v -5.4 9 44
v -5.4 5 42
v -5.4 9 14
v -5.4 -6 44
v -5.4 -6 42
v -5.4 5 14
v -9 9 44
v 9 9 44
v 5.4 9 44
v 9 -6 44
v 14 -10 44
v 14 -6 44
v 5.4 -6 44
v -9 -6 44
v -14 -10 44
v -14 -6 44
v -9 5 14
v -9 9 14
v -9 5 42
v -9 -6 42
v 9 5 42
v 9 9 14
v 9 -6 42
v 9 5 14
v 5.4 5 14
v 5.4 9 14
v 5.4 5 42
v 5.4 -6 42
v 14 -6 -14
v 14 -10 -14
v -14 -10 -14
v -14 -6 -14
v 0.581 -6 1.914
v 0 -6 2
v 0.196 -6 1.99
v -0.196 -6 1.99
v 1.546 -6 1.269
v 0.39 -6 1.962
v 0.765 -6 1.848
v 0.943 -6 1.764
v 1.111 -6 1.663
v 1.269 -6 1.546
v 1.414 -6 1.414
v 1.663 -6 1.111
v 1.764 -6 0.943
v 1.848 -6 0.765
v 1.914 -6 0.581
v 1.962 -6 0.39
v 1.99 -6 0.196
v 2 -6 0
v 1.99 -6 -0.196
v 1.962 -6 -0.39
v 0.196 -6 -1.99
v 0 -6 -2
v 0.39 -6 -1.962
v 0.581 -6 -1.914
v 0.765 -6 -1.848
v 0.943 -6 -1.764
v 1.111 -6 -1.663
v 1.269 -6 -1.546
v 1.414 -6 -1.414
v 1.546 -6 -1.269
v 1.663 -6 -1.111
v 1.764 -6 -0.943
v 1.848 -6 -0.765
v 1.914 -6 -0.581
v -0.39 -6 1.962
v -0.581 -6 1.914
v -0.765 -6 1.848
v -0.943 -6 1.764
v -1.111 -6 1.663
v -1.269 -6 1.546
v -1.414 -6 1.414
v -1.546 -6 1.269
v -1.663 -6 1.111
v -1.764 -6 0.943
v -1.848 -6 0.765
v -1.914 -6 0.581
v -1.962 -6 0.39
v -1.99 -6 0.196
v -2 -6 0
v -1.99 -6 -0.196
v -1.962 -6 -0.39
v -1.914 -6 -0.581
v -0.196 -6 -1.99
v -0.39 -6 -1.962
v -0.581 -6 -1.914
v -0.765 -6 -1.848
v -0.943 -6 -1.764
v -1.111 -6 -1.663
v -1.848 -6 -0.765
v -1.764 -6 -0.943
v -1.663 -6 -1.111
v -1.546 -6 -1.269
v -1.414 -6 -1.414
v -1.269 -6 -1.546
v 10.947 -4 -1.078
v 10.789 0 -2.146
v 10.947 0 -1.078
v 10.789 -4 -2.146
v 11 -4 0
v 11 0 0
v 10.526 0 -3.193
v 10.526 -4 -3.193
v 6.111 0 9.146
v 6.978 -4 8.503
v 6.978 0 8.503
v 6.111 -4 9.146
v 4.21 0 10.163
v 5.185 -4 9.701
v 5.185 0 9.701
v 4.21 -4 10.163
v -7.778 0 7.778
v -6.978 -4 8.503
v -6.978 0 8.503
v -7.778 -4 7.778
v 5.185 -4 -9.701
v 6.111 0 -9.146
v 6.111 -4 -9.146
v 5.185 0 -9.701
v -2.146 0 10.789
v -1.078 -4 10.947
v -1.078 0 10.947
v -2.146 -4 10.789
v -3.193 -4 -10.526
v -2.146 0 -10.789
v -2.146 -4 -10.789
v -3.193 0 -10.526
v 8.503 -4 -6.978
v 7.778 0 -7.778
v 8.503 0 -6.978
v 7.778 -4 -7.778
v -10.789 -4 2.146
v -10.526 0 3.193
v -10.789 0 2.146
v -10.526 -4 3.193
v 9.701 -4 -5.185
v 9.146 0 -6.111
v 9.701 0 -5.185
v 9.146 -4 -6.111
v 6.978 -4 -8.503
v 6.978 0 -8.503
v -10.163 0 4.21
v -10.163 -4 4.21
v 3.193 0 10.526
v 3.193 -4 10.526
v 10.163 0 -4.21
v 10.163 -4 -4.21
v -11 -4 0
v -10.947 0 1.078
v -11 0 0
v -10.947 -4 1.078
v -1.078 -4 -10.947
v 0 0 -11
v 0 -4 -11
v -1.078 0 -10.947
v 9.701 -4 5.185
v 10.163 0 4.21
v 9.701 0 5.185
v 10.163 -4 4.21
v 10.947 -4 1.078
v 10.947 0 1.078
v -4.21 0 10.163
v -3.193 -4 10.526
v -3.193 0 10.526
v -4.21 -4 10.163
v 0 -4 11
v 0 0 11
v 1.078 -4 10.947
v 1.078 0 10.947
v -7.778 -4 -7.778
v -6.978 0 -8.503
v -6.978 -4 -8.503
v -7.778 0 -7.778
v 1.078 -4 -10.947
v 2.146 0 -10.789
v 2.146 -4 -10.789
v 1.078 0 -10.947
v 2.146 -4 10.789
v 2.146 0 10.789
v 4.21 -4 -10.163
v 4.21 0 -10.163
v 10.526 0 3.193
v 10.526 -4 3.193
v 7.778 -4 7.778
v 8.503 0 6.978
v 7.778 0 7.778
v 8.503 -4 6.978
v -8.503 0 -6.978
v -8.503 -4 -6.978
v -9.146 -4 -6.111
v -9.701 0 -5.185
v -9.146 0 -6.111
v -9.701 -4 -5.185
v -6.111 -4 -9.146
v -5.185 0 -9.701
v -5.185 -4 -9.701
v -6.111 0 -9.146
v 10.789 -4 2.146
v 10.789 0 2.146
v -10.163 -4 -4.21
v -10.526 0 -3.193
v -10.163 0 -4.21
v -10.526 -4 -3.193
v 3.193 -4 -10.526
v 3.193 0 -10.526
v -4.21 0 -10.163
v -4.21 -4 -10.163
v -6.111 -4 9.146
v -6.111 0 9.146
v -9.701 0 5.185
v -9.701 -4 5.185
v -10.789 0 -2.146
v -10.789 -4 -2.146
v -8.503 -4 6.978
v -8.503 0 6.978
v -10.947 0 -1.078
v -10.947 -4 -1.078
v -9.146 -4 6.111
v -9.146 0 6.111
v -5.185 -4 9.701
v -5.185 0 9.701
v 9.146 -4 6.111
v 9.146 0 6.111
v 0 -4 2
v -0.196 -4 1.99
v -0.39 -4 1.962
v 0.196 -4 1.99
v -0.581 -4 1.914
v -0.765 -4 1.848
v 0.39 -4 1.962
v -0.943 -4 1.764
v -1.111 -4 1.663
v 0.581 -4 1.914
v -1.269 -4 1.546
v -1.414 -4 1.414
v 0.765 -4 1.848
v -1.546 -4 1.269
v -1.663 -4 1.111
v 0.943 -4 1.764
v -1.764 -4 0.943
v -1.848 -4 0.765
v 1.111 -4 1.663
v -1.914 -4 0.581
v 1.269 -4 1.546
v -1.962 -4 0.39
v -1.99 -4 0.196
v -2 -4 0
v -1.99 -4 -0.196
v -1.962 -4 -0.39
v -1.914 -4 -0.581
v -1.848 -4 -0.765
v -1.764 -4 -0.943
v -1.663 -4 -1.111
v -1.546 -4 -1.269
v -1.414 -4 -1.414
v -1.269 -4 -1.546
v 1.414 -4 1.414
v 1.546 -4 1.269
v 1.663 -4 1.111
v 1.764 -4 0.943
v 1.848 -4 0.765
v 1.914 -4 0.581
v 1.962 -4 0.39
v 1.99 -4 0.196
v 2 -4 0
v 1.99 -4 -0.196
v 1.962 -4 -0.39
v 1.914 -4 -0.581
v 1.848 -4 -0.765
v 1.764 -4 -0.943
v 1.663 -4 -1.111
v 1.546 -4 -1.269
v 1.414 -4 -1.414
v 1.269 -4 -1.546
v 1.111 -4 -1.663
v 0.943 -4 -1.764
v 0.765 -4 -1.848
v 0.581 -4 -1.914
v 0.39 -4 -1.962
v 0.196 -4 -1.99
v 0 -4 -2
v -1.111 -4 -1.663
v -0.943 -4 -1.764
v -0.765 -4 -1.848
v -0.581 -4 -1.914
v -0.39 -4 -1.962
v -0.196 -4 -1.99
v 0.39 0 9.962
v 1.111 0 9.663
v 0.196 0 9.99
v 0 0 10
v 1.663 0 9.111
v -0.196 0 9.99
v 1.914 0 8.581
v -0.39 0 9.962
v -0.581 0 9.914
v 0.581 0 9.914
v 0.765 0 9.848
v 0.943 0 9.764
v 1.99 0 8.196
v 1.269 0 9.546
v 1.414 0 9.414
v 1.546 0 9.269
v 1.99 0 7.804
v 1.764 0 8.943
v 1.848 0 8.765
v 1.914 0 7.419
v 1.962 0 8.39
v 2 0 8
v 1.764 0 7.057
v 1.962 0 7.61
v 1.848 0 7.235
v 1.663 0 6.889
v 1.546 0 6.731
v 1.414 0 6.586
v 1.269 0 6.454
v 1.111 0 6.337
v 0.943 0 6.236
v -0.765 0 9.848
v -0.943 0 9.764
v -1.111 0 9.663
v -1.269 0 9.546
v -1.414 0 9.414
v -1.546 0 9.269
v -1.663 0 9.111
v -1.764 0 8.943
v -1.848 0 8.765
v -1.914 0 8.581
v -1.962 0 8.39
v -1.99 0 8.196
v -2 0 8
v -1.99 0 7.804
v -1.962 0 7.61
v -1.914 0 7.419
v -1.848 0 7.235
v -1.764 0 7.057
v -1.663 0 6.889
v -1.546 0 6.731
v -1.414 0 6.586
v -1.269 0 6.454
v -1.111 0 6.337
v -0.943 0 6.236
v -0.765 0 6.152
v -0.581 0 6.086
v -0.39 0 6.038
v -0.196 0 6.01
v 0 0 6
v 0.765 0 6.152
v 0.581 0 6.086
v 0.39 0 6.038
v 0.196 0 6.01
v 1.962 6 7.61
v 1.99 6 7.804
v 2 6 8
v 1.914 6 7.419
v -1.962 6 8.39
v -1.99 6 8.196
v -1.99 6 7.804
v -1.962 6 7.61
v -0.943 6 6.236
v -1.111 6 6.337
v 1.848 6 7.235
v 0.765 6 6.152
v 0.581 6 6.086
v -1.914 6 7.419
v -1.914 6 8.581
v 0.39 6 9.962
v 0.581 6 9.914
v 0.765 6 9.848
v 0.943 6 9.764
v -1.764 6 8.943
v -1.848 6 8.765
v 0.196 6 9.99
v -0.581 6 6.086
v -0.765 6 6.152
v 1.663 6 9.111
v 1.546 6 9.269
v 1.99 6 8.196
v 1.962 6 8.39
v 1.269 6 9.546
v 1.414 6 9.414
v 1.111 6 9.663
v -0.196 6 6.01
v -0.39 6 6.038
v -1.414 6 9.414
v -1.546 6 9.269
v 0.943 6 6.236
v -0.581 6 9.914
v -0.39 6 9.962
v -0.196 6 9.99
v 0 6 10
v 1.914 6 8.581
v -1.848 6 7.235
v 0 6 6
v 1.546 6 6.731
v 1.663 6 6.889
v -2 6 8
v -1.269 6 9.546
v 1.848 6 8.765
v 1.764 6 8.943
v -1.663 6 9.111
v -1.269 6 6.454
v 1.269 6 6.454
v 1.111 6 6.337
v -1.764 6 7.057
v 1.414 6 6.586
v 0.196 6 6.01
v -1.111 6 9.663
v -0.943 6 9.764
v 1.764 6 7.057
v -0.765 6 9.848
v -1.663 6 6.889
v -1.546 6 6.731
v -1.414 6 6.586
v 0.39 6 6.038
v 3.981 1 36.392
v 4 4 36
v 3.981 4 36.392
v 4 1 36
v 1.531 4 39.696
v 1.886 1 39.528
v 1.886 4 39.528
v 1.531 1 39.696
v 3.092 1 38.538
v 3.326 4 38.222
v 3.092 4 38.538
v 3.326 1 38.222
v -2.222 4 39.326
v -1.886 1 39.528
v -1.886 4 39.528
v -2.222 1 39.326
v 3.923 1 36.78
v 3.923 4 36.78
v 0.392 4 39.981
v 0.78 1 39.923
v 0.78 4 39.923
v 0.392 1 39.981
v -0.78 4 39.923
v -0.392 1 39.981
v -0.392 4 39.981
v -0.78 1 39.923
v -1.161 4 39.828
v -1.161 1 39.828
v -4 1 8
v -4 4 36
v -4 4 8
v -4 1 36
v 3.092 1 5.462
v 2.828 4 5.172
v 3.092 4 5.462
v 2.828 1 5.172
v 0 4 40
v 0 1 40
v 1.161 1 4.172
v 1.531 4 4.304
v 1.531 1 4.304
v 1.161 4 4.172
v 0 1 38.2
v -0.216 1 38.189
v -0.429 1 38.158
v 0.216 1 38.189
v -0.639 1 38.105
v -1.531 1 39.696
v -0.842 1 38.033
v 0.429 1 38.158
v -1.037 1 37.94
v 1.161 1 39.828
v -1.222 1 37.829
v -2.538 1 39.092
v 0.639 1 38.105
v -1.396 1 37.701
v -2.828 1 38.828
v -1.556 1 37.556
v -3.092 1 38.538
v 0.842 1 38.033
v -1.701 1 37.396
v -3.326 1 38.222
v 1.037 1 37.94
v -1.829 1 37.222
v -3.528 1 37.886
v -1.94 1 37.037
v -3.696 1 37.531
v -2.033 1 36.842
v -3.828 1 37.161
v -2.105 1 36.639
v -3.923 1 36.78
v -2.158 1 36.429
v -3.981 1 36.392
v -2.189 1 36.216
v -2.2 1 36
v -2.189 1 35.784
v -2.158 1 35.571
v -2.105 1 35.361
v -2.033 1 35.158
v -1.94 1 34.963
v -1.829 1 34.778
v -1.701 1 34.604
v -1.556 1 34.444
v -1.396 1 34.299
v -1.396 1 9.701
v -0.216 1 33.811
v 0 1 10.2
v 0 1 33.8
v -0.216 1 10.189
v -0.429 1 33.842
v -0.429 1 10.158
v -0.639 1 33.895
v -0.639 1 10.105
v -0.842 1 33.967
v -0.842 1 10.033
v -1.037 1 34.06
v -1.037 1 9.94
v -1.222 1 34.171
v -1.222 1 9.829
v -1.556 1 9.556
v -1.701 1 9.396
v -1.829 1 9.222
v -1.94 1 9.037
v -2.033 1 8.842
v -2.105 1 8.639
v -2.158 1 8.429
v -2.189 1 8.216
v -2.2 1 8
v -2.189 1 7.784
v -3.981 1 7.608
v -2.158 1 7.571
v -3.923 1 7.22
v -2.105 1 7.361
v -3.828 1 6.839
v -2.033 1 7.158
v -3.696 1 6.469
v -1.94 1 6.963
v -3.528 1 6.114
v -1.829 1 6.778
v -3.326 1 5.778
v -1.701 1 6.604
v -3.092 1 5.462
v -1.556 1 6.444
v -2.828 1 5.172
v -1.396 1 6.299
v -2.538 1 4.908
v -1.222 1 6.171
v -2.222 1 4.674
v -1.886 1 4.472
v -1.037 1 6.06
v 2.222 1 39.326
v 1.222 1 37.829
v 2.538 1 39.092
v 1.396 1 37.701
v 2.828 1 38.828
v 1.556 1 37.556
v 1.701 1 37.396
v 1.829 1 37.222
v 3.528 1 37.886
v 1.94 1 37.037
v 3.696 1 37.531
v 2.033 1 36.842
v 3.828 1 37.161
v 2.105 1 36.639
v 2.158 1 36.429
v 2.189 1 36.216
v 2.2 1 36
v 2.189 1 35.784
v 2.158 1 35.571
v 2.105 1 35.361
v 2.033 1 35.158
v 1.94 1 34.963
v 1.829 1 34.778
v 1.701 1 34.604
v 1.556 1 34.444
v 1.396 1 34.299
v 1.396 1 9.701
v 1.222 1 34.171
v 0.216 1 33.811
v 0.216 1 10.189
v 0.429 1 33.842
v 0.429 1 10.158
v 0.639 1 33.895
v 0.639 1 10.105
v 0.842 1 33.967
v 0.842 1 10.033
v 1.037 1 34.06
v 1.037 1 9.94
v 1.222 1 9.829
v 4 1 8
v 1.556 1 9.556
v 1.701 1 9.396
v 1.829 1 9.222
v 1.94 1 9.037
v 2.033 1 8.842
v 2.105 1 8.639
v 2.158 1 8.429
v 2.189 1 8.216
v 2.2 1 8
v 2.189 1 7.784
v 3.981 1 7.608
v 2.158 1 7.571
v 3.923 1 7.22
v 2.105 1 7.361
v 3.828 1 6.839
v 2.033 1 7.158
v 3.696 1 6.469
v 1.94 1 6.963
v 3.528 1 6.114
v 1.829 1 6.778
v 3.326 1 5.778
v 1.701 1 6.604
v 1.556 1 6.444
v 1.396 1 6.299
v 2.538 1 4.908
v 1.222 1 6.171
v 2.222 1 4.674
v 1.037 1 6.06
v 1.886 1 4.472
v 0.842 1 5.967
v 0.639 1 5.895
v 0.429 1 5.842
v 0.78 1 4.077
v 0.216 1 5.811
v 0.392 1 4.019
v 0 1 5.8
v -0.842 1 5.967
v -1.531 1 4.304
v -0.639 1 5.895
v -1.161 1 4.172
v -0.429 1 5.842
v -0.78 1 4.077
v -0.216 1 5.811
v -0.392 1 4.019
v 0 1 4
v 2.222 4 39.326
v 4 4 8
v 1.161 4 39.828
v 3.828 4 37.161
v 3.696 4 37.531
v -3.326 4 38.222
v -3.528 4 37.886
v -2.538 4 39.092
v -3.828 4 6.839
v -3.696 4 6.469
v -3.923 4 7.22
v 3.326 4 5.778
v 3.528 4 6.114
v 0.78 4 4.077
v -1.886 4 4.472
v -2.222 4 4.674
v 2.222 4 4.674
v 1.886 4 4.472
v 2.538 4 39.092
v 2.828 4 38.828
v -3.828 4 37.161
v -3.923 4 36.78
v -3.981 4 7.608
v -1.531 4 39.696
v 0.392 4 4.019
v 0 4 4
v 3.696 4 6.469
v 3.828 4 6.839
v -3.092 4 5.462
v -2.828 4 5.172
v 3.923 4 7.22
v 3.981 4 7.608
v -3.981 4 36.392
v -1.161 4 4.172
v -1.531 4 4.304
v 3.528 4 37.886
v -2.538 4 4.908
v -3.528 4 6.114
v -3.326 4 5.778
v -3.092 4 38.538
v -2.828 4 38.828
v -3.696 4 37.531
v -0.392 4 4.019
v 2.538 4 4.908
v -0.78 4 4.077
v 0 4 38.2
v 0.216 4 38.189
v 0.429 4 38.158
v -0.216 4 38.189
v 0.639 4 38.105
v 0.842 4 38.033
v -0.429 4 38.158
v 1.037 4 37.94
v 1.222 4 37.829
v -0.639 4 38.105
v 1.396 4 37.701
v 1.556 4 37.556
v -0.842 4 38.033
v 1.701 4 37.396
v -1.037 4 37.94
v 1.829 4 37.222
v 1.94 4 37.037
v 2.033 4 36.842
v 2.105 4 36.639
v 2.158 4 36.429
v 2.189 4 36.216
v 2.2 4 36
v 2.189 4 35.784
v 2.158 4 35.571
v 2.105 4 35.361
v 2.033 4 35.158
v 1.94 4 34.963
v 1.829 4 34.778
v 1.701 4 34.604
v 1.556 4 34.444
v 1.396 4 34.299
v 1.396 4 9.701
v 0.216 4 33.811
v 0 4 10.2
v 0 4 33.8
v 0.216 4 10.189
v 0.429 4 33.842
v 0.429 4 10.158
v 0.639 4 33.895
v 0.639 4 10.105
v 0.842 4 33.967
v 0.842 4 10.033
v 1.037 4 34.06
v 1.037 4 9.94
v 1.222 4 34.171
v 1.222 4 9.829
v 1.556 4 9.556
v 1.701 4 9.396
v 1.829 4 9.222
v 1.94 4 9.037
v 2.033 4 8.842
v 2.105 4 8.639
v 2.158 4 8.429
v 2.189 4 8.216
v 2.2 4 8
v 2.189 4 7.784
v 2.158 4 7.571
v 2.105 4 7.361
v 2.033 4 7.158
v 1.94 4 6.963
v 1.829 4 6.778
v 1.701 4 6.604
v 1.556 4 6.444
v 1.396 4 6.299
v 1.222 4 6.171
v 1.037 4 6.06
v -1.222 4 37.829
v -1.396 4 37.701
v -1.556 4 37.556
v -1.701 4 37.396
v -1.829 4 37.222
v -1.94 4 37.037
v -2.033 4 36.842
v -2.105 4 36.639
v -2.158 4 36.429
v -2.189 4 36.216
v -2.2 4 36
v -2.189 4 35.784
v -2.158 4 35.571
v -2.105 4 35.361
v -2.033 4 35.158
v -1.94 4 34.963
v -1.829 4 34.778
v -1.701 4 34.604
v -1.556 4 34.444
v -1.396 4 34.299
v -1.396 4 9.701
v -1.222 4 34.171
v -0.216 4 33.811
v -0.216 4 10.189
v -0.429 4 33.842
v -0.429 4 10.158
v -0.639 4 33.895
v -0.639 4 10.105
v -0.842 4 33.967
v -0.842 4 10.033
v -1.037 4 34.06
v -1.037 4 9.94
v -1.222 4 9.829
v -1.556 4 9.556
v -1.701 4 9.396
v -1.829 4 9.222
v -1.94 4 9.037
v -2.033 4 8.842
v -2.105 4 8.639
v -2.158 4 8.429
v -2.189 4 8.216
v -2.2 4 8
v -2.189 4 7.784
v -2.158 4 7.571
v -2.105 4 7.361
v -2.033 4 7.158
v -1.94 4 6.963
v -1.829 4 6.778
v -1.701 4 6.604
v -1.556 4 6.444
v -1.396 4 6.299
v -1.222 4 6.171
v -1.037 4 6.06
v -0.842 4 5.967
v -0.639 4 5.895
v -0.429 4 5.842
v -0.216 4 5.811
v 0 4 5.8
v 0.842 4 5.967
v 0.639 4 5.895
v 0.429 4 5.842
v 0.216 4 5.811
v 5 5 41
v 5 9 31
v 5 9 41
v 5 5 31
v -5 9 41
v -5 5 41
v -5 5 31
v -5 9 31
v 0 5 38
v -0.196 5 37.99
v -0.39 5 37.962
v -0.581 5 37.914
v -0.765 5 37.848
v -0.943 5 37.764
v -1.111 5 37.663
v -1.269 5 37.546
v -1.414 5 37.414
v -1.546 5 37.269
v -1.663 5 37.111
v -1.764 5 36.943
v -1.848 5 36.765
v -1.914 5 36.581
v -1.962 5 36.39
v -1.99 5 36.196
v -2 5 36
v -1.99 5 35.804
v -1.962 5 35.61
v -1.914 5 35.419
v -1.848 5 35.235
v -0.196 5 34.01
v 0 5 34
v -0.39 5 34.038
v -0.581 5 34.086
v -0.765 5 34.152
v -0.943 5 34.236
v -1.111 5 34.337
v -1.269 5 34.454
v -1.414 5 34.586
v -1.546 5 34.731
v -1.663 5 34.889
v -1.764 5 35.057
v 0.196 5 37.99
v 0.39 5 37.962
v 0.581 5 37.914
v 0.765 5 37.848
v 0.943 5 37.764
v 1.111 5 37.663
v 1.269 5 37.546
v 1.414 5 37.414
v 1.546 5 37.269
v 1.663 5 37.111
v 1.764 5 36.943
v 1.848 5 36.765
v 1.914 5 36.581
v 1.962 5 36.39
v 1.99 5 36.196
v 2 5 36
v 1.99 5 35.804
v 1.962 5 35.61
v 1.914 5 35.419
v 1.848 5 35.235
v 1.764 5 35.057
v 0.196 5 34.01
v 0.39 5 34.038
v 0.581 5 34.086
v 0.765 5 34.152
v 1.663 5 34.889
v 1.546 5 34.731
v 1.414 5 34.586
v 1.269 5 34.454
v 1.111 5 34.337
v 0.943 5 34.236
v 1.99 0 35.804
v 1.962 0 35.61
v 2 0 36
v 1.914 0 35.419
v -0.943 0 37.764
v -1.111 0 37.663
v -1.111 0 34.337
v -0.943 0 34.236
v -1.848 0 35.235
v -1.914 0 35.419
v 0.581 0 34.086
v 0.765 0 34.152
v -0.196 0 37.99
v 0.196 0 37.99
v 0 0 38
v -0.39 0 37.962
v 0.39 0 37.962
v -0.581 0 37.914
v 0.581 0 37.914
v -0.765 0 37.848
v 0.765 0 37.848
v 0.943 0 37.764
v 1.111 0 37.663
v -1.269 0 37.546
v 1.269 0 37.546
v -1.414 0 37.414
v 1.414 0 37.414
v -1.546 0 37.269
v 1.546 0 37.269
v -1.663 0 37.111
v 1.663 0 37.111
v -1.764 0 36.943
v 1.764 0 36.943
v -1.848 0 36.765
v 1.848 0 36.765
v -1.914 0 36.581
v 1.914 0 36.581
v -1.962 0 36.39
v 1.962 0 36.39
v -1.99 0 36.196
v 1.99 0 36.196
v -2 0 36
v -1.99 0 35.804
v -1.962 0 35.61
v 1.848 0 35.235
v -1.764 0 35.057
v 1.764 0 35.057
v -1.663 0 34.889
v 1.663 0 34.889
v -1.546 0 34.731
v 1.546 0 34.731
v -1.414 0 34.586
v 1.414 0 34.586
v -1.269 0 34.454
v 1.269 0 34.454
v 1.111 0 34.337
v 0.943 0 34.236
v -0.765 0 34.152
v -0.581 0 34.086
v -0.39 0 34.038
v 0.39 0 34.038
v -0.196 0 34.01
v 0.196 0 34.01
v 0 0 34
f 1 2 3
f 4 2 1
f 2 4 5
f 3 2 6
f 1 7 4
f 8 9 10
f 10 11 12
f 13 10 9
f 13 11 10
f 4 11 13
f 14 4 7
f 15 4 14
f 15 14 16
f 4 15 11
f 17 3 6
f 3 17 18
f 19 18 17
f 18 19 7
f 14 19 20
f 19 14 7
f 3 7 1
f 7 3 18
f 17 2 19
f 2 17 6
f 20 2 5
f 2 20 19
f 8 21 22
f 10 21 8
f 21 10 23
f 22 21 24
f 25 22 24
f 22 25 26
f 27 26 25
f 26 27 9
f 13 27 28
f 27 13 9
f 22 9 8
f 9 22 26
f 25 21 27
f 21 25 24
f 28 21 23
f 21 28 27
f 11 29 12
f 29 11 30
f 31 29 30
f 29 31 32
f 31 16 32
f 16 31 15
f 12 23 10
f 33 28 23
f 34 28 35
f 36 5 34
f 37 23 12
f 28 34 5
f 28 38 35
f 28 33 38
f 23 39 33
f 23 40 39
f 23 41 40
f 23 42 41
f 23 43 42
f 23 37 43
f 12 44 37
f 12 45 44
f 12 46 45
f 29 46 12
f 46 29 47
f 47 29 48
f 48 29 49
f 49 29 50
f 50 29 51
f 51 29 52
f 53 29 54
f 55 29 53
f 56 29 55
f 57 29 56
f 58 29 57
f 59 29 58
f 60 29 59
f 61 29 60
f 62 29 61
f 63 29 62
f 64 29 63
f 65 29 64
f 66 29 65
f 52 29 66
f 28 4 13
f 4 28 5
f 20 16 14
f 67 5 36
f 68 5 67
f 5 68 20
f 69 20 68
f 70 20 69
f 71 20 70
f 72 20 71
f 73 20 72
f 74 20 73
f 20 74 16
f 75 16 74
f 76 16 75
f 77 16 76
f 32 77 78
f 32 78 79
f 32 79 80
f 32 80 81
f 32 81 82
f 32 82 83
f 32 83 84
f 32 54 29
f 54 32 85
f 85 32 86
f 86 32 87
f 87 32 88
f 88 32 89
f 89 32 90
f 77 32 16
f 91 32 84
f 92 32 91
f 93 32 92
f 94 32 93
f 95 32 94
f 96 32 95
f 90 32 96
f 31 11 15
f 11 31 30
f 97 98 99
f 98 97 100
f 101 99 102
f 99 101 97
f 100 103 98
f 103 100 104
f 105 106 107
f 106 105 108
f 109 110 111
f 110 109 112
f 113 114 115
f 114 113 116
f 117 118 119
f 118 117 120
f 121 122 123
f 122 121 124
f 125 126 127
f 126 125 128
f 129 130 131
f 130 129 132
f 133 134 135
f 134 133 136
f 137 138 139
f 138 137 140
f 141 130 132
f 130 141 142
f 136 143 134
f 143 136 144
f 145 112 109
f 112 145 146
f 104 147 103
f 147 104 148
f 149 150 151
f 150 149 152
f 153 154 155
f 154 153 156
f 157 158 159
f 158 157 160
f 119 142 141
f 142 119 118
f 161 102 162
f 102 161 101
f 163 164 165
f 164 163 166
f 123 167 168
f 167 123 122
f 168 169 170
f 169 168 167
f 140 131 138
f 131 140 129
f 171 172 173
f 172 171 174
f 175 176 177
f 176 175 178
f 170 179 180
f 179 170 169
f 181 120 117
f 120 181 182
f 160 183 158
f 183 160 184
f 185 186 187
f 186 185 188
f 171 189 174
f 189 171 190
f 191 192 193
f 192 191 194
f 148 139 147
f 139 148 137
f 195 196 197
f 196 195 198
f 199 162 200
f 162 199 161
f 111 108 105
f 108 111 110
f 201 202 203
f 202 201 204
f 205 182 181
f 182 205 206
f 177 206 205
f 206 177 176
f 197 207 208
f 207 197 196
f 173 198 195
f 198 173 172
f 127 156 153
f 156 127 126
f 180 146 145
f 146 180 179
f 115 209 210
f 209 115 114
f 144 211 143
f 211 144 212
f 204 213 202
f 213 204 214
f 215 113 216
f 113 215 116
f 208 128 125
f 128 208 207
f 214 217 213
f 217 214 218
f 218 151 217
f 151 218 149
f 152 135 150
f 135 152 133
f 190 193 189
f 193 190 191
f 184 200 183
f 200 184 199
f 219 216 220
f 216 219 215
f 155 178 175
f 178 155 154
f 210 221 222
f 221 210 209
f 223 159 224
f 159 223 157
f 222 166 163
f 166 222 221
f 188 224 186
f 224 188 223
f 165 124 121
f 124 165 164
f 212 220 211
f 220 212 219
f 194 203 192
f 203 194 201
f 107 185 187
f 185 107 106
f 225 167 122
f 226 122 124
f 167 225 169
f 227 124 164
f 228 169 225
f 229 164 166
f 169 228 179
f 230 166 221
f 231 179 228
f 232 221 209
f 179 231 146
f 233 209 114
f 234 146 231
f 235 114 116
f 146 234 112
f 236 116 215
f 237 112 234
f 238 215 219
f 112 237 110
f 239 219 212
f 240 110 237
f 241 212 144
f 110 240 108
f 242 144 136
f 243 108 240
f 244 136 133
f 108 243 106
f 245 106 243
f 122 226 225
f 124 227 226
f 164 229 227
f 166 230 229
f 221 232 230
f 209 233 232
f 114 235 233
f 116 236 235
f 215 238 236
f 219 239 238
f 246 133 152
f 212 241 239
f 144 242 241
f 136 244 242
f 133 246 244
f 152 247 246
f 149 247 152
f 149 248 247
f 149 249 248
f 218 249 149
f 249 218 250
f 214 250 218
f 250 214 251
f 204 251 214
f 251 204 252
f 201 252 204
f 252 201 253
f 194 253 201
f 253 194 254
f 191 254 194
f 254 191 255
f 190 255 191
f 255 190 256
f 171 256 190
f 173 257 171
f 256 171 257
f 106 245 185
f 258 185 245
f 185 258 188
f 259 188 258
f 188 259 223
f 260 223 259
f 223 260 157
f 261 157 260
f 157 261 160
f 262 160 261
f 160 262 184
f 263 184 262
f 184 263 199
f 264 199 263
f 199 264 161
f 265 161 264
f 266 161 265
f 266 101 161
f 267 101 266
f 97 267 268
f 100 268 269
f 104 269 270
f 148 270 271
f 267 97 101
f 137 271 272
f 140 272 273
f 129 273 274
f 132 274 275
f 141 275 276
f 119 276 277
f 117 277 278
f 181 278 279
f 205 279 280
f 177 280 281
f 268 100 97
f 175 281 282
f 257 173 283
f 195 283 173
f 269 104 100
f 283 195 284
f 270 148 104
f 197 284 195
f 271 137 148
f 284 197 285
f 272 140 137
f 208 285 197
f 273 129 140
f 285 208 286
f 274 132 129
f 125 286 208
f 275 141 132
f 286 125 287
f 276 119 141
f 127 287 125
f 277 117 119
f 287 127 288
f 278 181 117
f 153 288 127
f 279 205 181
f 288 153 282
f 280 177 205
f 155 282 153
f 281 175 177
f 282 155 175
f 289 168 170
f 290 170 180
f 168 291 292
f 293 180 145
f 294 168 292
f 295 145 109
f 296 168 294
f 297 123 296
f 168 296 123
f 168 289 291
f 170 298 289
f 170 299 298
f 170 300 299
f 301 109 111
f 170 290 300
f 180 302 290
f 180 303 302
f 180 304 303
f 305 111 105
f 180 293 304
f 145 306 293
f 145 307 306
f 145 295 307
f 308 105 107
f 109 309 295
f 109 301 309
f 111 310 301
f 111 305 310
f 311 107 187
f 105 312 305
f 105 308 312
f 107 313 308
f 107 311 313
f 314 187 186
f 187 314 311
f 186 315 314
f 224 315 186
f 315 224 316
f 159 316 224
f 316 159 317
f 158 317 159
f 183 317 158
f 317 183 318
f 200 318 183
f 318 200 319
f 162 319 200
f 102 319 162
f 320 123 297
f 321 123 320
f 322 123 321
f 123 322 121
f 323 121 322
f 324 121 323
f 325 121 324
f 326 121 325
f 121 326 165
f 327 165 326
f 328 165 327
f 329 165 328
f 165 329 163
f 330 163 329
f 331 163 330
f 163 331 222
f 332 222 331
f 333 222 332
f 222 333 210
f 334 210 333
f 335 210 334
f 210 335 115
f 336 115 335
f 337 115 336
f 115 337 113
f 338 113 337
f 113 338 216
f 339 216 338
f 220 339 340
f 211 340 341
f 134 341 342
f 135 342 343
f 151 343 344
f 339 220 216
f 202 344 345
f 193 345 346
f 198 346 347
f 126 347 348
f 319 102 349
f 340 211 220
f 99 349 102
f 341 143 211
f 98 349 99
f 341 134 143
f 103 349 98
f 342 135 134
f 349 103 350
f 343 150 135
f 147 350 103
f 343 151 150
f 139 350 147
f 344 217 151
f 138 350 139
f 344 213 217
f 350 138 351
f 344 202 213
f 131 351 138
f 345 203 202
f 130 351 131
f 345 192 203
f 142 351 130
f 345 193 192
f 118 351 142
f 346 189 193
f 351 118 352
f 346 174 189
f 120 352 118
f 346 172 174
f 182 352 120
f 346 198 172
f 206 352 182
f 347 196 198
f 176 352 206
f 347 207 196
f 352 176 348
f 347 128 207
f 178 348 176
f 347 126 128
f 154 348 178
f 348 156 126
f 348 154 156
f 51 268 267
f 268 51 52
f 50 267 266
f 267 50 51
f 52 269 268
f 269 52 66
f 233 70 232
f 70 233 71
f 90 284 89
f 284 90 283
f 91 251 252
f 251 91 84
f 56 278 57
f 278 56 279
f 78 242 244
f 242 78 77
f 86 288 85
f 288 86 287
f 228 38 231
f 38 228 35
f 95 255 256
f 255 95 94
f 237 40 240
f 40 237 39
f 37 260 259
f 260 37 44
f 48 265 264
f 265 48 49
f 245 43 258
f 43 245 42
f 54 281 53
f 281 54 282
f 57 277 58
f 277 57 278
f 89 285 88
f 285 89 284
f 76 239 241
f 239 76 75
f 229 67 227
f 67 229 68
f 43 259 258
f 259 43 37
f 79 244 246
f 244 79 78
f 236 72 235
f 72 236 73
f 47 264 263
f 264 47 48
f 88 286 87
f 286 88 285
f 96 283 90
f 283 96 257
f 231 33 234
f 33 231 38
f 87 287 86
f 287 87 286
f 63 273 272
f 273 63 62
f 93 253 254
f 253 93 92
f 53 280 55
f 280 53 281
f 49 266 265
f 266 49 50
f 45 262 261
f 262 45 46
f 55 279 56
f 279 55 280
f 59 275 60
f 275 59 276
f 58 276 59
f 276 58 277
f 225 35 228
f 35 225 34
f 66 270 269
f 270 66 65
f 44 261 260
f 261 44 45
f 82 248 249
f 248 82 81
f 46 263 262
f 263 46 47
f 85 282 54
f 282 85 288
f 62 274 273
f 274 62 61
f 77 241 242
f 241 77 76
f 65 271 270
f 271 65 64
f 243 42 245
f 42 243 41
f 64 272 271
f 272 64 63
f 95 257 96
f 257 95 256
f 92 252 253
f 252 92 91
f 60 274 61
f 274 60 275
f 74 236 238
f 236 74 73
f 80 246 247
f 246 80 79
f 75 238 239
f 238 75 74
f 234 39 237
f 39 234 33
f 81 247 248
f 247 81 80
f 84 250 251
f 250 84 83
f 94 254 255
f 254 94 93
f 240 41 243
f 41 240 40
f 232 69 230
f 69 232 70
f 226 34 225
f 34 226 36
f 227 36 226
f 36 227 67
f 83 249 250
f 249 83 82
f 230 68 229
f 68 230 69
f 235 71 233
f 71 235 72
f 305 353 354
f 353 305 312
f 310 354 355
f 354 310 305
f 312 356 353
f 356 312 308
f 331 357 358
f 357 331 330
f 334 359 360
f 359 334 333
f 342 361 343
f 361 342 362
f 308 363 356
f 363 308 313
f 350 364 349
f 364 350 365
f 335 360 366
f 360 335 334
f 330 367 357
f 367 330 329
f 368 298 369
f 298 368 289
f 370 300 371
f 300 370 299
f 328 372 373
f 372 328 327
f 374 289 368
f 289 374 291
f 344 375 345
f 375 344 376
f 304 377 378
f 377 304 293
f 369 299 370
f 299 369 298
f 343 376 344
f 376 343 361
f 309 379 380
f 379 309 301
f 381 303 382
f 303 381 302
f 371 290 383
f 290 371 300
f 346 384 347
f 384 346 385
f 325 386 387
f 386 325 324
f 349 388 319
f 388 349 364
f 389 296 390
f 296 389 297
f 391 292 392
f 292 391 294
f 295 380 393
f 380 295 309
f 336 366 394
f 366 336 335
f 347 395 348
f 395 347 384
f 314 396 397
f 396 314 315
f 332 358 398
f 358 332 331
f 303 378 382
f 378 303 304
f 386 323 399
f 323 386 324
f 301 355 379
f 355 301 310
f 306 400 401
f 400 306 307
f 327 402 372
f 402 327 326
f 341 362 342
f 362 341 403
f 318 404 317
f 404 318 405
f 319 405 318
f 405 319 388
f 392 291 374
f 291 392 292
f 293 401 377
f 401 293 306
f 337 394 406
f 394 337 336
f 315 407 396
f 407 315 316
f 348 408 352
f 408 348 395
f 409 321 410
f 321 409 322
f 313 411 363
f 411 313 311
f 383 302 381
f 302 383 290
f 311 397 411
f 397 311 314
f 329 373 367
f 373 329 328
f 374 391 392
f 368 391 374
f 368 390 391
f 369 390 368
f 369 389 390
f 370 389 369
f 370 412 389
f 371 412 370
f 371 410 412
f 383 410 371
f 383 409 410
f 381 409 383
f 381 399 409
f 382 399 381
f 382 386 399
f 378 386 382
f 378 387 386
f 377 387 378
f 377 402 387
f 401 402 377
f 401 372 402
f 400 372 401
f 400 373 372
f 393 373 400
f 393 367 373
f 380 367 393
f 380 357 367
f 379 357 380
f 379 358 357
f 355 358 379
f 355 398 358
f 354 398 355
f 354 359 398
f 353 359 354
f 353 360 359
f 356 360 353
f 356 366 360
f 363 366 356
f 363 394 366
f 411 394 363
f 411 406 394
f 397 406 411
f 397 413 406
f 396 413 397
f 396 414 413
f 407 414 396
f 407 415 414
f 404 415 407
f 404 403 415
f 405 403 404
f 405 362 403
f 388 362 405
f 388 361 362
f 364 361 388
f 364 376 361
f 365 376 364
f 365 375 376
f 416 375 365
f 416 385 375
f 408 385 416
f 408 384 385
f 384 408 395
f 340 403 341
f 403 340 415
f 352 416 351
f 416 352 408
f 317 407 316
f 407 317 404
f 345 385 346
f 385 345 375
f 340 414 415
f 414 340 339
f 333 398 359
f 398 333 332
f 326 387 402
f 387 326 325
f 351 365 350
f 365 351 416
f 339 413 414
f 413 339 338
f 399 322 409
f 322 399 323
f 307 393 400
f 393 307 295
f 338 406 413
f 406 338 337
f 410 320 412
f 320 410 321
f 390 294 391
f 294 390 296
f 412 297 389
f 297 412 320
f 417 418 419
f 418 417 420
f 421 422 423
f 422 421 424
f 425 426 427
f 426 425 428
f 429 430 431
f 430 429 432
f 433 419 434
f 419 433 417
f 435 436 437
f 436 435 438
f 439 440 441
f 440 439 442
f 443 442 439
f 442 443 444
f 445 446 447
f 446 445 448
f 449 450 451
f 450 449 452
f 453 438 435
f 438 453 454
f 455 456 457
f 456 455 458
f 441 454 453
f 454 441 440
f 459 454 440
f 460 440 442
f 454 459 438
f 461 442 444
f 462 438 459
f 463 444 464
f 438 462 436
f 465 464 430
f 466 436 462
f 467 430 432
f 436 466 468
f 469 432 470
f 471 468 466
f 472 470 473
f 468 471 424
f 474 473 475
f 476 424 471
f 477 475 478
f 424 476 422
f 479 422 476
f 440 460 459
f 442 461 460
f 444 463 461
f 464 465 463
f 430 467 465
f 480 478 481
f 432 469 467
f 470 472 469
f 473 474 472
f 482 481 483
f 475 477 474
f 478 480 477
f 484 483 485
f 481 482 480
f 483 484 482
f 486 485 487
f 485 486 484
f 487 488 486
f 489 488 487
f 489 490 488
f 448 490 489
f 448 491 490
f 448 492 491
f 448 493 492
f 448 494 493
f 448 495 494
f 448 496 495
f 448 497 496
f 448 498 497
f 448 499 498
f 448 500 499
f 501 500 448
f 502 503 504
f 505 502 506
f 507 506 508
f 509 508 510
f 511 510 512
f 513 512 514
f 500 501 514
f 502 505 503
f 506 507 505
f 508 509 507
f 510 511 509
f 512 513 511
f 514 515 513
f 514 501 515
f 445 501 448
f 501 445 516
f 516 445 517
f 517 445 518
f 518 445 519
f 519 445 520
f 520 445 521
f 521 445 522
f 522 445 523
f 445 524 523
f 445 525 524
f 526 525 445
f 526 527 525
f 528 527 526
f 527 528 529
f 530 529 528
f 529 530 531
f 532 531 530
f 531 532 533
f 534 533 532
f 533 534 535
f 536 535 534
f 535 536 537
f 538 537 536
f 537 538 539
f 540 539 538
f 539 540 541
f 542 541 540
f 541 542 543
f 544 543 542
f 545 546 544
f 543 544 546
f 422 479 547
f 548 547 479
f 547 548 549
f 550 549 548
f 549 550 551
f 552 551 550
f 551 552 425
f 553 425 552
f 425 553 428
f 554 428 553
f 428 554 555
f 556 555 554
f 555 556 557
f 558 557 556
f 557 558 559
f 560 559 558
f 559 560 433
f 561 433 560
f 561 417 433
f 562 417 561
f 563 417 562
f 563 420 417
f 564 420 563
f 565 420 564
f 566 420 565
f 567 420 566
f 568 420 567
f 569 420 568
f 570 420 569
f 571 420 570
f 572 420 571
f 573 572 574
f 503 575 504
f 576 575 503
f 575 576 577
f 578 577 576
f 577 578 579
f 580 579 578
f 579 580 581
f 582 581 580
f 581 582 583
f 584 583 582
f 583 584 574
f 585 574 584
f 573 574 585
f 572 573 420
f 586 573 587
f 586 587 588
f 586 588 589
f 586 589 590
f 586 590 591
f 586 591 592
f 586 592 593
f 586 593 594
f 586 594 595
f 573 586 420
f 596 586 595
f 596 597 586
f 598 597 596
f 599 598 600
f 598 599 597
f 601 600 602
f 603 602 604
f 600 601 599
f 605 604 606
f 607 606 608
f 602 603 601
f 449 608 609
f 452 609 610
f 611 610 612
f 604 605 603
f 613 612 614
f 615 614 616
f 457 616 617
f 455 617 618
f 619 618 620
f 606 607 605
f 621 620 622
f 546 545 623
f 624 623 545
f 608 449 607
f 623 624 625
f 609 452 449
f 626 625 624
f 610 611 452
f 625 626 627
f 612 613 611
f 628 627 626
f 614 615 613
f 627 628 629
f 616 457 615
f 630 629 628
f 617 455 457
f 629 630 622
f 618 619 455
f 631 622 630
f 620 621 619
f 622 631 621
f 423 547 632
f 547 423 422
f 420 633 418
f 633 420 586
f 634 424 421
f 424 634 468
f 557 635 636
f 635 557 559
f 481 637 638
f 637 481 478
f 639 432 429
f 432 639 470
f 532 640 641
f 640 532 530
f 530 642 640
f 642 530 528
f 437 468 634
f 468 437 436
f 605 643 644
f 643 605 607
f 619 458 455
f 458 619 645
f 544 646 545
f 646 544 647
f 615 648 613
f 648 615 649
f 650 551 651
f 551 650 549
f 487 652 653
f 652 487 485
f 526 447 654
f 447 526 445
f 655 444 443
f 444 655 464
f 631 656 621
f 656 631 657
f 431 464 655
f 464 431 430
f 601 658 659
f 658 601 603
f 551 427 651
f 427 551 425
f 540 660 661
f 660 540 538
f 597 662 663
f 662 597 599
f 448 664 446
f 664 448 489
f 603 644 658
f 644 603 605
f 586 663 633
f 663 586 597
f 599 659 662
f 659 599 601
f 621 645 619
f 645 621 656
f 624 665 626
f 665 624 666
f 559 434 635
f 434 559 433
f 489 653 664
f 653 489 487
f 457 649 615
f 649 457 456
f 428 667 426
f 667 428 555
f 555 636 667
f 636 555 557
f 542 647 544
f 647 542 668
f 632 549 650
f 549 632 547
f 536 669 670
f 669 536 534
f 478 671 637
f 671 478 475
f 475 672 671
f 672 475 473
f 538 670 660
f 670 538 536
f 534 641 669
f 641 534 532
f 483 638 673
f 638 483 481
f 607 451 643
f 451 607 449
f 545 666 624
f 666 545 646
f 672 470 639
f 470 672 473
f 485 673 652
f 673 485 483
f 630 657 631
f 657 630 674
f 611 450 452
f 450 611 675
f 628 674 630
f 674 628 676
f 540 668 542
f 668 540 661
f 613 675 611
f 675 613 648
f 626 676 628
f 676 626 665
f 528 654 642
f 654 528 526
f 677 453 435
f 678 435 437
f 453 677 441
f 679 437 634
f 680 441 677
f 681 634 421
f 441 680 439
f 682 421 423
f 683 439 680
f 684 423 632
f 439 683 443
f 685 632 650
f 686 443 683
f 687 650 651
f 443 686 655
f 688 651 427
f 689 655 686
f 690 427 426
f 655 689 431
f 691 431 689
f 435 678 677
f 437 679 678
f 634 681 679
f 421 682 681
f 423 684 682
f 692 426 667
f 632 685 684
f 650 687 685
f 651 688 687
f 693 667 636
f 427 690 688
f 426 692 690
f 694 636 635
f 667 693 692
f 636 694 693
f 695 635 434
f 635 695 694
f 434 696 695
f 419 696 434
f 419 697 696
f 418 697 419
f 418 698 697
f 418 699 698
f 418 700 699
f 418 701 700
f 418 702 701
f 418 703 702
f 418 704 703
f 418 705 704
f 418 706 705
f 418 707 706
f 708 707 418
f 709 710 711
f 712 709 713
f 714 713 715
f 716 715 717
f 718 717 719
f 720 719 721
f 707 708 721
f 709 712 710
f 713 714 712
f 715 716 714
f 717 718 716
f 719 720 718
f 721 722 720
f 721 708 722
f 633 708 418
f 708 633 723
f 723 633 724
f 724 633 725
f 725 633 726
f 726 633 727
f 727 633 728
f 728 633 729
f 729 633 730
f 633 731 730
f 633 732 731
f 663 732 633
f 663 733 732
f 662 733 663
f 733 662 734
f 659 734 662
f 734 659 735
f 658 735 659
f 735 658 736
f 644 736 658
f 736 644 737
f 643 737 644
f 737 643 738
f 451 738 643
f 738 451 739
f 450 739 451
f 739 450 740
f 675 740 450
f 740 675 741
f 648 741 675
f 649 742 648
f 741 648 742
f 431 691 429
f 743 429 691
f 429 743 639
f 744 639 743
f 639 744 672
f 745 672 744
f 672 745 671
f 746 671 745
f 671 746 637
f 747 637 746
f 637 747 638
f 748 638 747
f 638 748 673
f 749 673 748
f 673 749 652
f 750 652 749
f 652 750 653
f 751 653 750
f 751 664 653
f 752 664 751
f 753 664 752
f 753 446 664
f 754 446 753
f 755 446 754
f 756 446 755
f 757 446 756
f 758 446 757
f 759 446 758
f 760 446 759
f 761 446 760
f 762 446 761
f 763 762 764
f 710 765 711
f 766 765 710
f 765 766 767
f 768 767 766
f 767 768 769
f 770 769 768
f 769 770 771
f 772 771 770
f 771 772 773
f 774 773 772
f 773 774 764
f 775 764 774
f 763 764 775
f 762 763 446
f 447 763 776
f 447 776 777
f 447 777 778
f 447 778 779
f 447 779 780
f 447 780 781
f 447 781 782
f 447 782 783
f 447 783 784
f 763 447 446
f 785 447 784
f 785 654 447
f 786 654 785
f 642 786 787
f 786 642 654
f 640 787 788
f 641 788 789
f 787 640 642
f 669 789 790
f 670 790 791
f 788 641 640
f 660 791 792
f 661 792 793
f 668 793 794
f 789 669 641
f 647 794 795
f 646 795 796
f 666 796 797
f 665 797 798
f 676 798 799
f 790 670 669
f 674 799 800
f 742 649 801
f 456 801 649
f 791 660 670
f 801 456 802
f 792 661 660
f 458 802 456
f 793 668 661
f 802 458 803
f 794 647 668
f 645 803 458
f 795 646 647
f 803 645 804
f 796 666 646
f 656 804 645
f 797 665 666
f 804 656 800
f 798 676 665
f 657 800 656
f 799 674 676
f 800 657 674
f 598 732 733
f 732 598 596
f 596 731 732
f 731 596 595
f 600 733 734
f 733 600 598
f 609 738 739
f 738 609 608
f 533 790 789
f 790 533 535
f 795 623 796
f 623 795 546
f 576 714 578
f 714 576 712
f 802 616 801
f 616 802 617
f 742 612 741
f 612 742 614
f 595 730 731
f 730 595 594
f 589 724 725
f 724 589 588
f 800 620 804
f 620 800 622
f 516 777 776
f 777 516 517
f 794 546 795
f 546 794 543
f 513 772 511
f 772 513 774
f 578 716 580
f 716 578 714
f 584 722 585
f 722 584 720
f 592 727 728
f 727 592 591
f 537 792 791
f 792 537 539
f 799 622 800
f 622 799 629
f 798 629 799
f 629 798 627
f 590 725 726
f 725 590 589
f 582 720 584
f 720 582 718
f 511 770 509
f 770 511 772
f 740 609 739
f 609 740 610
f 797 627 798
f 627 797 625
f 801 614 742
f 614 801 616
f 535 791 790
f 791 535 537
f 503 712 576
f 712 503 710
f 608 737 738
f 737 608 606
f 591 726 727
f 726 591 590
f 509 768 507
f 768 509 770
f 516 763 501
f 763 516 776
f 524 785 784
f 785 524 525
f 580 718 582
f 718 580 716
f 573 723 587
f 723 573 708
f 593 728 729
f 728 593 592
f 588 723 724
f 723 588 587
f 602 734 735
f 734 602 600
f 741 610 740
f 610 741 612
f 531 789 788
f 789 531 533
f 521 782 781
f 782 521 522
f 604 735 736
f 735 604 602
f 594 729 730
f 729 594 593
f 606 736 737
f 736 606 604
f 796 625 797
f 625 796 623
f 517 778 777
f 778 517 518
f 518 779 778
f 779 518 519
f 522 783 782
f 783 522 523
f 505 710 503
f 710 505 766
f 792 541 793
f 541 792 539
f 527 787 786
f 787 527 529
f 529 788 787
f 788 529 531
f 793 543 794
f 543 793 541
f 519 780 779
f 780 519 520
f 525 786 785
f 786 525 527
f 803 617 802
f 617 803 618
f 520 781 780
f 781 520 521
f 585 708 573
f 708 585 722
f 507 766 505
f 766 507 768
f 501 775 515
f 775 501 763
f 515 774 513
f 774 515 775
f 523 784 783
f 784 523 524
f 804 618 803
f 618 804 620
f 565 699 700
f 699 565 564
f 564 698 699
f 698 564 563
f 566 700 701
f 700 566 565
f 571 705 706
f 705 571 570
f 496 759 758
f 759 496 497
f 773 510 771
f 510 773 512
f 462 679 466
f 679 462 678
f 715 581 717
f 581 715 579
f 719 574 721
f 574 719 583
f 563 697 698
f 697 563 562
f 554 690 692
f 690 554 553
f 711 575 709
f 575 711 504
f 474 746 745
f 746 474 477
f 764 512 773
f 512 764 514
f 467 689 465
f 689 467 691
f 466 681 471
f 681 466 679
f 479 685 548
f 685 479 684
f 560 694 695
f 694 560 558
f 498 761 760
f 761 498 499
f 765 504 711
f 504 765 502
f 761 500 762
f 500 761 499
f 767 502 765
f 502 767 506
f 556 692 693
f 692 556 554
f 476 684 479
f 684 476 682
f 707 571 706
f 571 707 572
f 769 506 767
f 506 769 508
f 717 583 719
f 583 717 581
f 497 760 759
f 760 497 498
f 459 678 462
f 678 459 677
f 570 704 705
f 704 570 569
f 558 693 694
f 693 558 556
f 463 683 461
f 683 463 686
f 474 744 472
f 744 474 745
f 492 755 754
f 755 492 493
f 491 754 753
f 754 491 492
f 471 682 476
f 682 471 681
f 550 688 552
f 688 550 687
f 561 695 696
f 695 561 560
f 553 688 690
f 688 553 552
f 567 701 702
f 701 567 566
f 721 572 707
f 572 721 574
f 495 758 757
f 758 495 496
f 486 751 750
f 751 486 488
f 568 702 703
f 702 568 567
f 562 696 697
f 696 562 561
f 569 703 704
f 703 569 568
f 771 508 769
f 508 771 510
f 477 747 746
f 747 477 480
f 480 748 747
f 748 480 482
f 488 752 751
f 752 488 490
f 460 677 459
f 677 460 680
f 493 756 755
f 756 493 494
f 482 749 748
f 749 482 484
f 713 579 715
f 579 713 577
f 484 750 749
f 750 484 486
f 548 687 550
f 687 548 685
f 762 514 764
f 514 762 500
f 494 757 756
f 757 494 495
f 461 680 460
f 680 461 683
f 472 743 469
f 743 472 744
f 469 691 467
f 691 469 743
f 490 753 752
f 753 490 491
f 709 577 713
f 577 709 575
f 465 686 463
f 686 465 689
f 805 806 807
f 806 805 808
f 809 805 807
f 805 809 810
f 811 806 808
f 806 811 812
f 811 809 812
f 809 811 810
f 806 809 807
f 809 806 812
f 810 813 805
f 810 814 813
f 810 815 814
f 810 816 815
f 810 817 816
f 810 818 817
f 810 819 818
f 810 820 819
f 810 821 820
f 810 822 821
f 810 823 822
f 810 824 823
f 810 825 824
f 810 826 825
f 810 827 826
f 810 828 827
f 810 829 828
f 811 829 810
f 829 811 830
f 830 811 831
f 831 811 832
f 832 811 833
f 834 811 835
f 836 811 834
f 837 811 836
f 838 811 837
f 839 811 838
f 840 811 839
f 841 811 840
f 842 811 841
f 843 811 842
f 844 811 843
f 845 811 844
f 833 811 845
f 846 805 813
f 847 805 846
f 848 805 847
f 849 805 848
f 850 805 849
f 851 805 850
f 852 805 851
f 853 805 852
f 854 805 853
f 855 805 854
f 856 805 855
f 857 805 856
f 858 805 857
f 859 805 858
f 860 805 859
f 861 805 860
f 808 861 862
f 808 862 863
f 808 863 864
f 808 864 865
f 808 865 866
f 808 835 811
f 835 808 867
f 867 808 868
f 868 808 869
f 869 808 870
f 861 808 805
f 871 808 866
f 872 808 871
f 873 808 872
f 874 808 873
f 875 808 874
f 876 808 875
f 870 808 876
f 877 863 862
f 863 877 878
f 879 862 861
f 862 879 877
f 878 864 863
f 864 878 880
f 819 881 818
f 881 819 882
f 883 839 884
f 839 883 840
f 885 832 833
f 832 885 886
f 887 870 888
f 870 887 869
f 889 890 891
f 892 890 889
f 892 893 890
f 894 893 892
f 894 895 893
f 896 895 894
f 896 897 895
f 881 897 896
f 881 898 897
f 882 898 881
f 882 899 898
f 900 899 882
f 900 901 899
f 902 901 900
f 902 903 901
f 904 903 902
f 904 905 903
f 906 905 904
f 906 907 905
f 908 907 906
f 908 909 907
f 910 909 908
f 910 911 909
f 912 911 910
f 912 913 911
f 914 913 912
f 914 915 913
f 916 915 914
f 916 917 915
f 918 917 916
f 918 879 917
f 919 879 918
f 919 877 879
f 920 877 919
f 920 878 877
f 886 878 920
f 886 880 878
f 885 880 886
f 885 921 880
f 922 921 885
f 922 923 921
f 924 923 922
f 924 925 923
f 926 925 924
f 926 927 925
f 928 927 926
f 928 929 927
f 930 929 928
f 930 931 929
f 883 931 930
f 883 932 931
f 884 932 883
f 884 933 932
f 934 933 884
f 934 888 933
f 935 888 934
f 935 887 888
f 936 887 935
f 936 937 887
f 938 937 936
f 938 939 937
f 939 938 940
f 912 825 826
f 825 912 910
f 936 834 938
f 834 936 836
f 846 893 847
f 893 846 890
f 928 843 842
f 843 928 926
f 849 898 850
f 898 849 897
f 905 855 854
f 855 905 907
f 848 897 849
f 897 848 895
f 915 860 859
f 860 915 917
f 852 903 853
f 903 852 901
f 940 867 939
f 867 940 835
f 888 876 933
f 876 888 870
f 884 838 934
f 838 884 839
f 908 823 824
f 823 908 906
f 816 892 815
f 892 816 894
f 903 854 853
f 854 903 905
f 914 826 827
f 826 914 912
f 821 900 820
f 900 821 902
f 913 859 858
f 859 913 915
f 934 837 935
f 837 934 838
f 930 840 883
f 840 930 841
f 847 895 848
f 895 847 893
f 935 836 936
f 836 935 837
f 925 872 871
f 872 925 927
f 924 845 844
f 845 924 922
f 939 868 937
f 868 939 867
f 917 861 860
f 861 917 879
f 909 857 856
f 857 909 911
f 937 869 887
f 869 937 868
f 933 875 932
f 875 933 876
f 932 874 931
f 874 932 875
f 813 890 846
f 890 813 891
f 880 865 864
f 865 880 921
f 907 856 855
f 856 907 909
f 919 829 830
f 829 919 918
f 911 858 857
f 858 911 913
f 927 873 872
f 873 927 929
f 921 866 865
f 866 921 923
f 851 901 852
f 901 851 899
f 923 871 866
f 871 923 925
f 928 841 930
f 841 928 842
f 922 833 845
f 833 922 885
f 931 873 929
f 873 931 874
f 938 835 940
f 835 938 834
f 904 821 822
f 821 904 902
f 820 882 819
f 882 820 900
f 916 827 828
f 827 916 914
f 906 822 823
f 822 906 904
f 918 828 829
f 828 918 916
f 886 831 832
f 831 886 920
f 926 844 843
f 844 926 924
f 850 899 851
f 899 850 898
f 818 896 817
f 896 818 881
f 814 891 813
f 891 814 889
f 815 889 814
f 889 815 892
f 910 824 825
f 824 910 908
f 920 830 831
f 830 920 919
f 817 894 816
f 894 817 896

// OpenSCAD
// Original low-speed slider-crank verification fixture, millimetres.
// Four manufacturing parts. Pins are integral; external axial retention is
// required. No load capacity, print tolerance or physical function is claimed.
agentscad_part = "all";
agentscad_pose = false;
motion_angle = 0;
crank_radius = 8;
rod_length = 28;
$fn = 64;

// All pin axes are parallel to +Y; the mechanism moves in the XZ plane.
module y_cylinder(radius, height) { rotate([-90, 0, 0]) cylinder(r=radius, h=height); }
module crank_local() {
  union() {
    translate([0, -4, 0]) y_cylinder(crank_radius + 3, 4);
    translate([0, -9, 0]) y_cylinder(2, 5.1);
    translate([0, -0.1, crank_radius]) y_cylinder(2, 6.1);
  }
}
module rod_local() {
  difference() {
    hull() {
      translate([0, 1, 0]) y_cylinder(4, 3);
      translate([0, 1, rod_length]) y_cylinder(4, 3);
    }
    translate([0, 0.9, 0]) y_cylinder(2.2, 3.2);
    translate([0, 0.9, rod_length]) y_cylinder(2.2, 3.2);
  }
}
module slider_local() {
  union() {
    translate([-5, 5, -5]) cube([10, 4, 10]);
    y_cylinder(2, 5.1);
  }
}
module frame_local() {
  union() {
    difference() {
      translate([-14, -10, -14]) cube([28, 4, 58]);
    }
    for (x = [-9, 5.4]) {
      translate([x, 5, 14]) cube([3.6, 4, 30]);
      translate([x, -6.1, 42]) cube([3.6, 11.2, 2]);
    }
  }
}

// Source-side construction. The checker measures the resulting mesh contours;
// it never consumes these functions or their computed coordinates as evidence.
cx = crank_radius * sin(motion_angle);
cz = crank_radius * cos(motion_angle);
travel = sqrt(rod_length * rod_length - cx * cx);
pz = cz + travel;
rod_angle = atan2(-cx, travel);
module selected_part(id, placed) {
  if (id == "frame") frame_local();
  if (id == "crank") rotate([0, placed ? motion_angle : 0, 0]) crank_local();
  if (id == "rod") translate(placed ? [cx, 0, cz] : [0, 0, 0])
    rotate([0, placed ? rod_angle : 0, 0]) rod_local();
  if (id == "slider") translate([0, 0, placed ? pz : 0]) slider_local();
}
module generated_part() {
  if (agentscad_part == "all") {
    for (id = ["frame", "crank", "rod", "slider"]) selected_part(id, true);
  } else selected_part(agentscad_part, agentscad_pose);
}
generated_part();
